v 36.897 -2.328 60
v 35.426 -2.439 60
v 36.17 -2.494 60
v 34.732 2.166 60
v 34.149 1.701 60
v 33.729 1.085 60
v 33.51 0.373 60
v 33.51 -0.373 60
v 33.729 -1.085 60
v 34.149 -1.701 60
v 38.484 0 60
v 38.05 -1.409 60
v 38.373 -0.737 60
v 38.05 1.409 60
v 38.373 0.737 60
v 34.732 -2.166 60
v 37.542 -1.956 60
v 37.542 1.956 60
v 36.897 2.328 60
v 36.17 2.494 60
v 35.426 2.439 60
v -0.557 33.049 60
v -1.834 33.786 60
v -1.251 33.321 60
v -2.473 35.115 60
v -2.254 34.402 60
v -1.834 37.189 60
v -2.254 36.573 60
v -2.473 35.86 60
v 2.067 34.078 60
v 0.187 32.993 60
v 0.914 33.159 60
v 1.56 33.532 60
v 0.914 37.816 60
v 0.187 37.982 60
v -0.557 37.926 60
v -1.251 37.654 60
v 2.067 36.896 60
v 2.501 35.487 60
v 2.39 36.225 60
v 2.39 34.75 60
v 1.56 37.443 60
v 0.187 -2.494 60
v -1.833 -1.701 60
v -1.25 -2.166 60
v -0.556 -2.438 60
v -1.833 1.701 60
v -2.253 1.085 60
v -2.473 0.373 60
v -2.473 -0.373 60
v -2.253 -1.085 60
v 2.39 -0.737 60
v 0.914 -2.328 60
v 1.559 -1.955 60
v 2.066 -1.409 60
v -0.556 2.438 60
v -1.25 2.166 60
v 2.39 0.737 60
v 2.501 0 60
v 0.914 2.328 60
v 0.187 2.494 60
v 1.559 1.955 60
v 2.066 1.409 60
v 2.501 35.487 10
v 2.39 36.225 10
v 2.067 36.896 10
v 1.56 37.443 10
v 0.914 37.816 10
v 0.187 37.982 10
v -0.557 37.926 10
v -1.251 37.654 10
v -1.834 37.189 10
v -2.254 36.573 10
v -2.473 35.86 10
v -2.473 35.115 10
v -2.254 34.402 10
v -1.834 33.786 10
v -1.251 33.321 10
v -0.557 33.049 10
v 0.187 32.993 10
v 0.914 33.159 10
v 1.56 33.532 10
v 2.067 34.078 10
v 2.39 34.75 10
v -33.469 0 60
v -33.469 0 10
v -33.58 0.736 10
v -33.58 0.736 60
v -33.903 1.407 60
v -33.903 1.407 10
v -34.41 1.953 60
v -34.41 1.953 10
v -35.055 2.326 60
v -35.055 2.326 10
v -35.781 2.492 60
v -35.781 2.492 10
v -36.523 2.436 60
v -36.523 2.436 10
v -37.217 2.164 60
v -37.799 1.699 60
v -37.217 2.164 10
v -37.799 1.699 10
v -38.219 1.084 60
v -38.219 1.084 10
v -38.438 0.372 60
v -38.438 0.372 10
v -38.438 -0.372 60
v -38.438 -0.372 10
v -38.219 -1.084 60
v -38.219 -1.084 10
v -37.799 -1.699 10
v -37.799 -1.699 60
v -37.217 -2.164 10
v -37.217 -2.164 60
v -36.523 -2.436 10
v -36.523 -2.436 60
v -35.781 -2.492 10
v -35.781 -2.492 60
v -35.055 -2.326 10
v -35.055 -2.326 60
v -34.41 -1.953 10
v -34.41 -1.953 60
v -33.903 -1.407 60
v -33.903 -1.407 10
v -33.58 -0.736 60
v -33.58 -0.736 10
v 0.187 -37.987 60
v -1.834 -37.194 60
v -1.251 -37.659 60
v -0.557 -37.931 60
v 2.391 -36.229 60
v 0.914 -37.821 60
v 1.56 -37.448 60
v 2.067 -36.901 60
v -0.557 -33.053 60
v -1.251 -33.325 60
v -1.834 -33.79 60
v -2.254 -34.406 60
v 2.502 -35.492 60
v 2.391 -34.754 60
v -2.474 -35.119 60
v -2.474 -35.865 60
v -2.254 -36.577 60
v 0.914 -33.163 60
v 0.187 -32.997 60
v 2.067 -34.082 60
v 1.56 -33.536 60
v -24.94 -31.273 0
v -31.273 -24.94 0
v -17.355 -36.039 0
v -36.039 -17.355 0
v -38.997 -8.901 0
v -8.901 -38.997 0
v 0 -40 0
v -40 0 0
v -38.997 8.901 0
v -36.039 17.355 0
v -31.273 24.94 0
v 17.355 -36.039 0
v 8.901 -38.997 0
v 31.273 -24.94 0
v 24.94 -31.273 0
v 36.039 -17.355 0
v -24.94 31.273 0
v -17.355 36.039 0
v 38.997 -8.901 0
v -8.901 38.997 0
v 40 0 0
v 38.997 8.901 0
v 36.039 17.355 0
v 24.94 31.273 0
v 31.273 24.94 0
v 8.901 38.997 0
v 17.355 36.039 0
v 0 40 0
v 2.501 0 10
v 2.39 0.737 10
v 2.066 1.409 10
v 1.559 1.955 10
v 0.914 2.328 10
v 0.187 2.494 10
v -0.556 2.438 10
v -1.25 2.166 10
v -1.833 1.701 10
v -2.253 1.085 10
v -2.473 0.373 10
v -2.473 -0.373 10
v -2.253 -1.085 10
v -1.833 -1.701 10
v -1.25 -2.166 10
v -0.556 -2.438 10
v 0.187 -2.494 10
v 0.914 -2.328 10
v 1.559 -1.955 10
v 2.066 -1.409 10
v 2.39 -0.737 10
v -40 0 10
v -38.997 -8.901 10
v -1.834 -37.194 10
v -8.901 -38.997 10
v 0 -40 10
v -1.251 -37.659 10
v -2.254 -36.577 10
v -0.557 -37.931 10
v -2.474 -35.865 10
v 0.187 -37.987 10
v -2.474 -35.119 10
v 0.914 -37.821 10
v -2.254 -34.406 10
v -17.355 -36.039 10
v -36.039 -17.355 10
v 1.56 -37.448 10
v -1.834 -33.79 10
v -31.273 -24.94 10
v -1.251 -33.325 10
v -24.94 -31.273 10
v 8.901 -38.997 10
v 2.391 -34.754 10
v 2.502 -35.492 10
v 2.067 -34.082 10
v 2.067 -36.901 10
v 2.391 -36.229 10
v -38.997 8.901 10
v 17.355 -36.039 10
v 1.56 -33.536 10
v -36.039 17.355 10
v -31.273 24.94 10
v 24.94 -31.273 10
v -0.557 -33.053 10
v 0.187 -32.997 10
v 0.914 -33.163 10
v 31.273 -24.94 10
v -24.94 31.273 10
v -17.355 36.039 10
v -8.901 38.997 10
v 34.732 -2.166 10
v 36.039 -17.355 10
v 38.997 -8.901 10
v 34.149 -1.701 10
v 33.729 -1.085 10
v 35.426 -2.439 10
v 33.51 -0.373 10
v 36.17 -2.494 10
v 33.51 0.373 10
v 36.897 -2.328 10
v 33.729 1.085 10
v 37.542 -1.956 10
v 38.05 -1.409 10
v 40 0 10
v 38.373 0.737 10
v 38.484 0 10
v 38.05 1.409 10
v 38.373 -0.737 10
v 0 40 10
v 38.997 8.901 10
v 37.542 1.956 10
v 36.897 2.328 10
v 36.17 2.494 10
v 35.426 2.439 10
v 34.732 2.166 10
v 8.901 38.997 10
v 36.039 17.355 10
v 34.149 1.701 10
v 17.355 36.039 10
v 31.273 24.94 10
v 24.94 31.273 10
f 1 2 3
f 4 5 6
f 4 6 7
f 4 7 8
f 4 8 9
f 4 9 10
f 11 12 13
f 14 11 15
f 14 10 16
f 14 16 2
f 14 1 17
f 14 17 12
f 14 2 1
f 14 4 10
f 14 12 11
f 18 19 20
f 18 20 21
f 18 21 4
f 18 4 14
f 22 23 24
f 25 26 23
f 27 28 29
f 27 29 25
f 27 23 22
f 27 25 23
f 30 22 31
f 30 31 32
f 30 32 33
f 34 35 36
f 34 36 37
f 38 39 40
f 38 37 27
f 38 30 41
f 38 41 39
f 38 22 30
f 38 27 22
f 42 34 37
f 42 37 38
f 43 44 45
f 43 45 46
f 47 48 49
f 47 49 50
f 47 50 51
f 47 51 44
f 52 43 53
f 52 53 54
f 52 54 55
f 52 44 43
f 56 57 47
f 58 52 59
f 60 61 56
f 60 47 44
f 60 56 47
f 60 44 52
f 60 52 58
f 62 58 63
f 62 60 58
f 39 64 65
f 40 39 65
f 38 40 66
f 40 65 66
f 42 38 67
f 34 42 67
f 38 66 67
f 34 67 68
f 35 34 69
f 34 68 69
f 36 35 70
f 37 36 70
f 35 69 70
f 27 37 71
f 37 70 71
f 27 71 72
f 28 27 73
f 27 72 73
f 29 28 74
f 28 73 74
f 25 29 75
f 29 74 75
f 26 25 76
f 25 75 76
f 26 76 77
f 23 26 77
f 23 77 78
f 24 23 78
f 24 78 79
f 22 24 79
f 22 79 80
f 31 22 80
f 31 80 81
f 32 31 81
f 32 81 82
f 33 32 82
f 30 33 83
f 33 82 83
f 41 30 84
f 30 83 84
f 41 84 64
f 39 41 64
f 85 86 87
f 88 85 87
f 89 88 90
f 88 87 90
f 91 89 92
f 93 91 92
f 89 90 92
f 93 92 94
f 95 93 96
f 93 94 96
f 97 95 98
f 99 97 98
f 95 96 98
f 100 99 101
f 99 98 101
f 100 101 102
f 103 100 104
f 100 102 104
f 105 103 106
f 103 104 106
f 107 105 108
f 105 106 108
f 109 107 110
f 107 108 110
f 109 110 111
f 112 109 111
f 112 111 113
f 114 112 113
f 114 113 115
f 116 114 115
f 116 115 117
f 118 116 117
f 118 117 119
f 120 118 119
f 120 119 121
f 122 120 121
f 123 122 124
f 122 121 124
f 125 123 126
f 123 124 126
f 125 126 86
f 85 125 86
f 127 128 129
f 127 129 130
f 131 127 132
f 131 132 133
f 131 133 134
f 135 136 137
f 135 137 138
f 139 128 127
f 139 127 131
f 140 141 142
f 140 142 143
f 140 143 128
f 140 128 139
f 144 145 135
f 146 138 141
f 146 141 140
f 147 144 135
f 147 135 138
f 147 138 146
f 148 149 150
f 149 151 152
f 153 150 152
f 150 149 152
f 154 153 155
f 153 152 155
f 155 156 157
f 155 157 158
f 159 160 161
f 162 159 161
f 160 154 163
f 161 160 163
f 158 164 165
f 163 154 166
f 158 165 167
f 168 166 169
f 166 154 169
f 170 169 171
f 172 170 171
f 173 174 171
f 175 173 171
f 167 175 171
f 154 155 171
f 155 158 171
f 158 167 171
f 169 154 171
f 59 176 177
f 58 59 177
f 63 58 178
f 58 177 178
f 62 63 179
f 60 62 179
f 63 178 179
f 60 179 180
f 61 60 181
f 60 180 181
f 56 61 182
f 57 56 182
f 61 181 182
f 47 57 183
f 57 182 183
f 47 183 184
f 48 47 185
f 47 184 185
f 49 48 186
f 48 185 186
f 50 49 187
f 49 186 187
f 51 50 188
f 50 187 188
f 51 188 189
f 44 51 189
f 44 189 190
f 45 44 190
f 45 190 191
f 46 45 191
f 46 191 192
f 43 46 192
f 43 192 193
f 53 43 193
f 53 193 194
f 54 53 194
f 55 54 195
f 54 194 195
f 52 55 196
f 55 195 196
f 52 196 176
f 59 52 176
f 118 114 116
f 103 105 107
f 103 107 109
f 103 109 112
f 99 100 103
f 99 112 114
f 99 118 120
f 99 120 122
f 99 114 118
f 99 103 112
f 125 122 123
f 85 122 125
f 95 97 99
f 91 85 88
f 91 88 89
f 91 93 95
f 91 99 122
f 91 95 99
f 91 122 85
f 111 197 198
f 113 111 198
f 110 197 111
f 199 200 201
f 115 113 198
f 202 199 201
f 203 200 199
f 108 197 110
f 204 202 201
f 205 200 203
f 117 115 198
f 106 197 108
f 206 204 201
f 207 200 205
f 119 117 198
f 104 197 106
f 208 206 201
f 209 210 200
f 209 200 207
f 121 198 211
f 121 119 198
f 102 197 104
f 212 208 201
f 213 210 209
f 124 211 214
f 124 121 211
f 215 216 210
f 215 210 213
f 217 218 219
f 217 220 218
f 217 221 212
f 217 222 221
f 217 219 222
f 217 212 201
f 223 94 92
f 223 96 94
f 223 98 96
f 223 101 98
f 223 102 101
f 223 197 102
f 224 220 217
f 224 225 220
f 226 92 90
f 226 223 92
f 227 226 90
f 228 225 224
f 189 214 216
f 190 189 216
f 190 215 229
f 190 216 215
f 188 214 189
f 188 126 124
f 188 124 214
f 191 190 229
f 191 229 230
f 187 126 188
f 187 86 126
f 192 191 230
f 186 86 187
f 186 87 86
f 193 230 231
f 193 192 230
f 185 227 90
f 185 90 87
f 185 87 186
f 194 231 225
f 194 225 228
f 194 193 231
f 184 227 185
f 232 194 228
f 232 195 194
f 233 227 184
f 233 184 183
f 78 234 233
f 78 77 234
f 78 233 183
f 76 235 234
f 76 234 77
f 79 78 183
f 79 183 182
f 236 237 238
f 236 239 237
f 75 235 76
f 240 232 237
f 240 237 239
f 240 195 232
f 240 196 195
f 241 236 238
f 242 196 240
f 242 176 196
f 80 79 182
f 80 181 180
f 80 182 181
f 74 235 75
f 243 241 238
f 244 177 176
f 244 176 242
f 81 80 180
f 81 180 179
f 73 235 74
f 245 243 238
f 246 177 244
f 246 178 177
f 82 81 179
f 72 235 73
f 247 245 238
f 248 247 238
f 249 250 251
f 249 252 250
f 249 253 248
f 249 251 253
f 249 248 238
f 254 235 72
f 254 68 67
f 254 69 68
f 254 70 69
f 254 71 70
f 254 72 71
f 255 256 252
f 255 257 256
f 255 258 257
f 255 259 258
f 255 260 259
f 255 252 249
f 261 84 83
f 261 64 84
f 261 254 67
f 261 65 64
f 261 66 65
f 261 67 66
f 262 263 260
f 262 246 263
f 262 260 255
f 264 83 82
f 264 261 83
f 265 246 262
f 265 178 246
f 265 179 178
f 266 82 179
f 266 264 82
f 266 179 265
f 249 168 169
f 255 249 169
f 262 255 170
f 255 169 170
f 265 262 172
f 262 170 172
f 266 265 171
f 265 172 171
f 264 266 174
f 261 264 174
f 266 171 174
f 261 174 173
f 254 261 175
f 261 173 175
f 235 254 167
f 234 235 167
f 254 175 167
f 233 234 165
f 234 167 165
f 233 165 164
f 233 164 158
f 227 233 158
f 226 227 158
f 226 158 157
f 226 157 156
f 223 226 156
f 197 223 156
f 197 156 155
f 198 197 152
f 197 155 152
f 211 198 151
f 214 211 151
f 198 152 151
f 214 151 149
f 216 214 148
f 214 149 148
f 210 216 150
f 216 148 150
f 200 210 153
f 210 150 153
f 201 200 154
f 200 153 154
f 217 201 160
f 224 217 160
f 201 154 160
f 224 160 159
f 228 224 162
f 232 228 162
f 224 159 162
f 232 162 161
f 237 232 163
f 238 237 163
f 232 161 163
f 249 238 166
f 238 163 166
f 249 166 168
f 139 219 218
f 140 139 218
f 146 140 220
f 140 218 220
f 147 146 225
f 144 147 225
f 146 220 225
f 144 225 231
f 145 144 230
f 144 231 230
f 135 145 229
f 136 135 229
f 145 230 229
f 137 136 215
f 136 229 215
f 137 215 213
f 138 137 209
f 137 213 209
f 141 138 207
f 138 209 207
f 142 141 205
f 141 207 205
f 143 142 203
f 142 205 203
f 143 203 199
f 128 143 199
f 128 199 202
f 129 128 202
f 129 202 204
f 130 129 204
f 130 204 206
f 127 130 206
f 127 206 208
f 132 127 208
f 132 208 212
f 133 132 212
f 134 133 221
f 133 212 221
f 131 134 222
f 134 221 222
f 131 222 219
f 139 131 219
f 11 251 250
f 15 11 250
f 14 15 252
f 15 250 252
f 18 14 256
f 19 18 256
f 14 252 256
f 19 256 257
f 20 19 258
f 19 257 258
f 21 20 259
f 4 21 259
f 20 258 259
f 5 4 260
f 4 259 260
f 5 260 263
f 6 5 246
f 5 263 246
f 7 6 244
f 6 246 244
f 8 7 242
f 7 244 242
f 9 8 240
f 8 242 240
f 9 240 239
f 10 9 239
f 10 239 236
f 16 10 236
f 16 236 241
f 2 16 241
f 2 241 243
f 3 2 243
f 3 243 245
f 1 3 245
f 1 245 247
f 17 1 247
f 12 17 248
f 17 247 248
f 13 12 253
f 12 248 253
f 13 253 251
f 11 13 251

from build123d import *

# Parameters (mm, degrees)
F0_R     = 40.000185
F1_DEPTH = 10
F2_R     = 2.50061
F3_DEPTH = 50
F4_R     = 2.501284
F4_R_2   = 2.498539
F4_R_3   = 2.501993
F4_R_4   = 2.501243
F5_DEPTH = 50


with BuildPart() as f1:
    # F0 (on Top) → F1 (new body)
    with BuildSketch(Plane.XY):
        Circle(F0_R)
    extrude(amount=F1_DEPTH)

    # F2 (on face) → F3 (join)
    with BuildSketch(Plane.XY.offset(10)):
        Circle(F2_R)
    extrude(amount=F3_DEPTH)

    # F4 (on face) → F5 (join)
    with BuildSketch(Plane.XY.offset(10)):
        with Locations((0, 35.487343)):
            Circle(F4_R)
        with Locations((-35.967495, 0)):
            Circle(F4_R_2)
        with Locations((0, -35.491817)):
            Circle(F4_R_3)
        with Locations((35.982933, 0)):
            Circle(F4_R_4)
    extrude(amount=F5_DEPTH)


solid = f1.part
